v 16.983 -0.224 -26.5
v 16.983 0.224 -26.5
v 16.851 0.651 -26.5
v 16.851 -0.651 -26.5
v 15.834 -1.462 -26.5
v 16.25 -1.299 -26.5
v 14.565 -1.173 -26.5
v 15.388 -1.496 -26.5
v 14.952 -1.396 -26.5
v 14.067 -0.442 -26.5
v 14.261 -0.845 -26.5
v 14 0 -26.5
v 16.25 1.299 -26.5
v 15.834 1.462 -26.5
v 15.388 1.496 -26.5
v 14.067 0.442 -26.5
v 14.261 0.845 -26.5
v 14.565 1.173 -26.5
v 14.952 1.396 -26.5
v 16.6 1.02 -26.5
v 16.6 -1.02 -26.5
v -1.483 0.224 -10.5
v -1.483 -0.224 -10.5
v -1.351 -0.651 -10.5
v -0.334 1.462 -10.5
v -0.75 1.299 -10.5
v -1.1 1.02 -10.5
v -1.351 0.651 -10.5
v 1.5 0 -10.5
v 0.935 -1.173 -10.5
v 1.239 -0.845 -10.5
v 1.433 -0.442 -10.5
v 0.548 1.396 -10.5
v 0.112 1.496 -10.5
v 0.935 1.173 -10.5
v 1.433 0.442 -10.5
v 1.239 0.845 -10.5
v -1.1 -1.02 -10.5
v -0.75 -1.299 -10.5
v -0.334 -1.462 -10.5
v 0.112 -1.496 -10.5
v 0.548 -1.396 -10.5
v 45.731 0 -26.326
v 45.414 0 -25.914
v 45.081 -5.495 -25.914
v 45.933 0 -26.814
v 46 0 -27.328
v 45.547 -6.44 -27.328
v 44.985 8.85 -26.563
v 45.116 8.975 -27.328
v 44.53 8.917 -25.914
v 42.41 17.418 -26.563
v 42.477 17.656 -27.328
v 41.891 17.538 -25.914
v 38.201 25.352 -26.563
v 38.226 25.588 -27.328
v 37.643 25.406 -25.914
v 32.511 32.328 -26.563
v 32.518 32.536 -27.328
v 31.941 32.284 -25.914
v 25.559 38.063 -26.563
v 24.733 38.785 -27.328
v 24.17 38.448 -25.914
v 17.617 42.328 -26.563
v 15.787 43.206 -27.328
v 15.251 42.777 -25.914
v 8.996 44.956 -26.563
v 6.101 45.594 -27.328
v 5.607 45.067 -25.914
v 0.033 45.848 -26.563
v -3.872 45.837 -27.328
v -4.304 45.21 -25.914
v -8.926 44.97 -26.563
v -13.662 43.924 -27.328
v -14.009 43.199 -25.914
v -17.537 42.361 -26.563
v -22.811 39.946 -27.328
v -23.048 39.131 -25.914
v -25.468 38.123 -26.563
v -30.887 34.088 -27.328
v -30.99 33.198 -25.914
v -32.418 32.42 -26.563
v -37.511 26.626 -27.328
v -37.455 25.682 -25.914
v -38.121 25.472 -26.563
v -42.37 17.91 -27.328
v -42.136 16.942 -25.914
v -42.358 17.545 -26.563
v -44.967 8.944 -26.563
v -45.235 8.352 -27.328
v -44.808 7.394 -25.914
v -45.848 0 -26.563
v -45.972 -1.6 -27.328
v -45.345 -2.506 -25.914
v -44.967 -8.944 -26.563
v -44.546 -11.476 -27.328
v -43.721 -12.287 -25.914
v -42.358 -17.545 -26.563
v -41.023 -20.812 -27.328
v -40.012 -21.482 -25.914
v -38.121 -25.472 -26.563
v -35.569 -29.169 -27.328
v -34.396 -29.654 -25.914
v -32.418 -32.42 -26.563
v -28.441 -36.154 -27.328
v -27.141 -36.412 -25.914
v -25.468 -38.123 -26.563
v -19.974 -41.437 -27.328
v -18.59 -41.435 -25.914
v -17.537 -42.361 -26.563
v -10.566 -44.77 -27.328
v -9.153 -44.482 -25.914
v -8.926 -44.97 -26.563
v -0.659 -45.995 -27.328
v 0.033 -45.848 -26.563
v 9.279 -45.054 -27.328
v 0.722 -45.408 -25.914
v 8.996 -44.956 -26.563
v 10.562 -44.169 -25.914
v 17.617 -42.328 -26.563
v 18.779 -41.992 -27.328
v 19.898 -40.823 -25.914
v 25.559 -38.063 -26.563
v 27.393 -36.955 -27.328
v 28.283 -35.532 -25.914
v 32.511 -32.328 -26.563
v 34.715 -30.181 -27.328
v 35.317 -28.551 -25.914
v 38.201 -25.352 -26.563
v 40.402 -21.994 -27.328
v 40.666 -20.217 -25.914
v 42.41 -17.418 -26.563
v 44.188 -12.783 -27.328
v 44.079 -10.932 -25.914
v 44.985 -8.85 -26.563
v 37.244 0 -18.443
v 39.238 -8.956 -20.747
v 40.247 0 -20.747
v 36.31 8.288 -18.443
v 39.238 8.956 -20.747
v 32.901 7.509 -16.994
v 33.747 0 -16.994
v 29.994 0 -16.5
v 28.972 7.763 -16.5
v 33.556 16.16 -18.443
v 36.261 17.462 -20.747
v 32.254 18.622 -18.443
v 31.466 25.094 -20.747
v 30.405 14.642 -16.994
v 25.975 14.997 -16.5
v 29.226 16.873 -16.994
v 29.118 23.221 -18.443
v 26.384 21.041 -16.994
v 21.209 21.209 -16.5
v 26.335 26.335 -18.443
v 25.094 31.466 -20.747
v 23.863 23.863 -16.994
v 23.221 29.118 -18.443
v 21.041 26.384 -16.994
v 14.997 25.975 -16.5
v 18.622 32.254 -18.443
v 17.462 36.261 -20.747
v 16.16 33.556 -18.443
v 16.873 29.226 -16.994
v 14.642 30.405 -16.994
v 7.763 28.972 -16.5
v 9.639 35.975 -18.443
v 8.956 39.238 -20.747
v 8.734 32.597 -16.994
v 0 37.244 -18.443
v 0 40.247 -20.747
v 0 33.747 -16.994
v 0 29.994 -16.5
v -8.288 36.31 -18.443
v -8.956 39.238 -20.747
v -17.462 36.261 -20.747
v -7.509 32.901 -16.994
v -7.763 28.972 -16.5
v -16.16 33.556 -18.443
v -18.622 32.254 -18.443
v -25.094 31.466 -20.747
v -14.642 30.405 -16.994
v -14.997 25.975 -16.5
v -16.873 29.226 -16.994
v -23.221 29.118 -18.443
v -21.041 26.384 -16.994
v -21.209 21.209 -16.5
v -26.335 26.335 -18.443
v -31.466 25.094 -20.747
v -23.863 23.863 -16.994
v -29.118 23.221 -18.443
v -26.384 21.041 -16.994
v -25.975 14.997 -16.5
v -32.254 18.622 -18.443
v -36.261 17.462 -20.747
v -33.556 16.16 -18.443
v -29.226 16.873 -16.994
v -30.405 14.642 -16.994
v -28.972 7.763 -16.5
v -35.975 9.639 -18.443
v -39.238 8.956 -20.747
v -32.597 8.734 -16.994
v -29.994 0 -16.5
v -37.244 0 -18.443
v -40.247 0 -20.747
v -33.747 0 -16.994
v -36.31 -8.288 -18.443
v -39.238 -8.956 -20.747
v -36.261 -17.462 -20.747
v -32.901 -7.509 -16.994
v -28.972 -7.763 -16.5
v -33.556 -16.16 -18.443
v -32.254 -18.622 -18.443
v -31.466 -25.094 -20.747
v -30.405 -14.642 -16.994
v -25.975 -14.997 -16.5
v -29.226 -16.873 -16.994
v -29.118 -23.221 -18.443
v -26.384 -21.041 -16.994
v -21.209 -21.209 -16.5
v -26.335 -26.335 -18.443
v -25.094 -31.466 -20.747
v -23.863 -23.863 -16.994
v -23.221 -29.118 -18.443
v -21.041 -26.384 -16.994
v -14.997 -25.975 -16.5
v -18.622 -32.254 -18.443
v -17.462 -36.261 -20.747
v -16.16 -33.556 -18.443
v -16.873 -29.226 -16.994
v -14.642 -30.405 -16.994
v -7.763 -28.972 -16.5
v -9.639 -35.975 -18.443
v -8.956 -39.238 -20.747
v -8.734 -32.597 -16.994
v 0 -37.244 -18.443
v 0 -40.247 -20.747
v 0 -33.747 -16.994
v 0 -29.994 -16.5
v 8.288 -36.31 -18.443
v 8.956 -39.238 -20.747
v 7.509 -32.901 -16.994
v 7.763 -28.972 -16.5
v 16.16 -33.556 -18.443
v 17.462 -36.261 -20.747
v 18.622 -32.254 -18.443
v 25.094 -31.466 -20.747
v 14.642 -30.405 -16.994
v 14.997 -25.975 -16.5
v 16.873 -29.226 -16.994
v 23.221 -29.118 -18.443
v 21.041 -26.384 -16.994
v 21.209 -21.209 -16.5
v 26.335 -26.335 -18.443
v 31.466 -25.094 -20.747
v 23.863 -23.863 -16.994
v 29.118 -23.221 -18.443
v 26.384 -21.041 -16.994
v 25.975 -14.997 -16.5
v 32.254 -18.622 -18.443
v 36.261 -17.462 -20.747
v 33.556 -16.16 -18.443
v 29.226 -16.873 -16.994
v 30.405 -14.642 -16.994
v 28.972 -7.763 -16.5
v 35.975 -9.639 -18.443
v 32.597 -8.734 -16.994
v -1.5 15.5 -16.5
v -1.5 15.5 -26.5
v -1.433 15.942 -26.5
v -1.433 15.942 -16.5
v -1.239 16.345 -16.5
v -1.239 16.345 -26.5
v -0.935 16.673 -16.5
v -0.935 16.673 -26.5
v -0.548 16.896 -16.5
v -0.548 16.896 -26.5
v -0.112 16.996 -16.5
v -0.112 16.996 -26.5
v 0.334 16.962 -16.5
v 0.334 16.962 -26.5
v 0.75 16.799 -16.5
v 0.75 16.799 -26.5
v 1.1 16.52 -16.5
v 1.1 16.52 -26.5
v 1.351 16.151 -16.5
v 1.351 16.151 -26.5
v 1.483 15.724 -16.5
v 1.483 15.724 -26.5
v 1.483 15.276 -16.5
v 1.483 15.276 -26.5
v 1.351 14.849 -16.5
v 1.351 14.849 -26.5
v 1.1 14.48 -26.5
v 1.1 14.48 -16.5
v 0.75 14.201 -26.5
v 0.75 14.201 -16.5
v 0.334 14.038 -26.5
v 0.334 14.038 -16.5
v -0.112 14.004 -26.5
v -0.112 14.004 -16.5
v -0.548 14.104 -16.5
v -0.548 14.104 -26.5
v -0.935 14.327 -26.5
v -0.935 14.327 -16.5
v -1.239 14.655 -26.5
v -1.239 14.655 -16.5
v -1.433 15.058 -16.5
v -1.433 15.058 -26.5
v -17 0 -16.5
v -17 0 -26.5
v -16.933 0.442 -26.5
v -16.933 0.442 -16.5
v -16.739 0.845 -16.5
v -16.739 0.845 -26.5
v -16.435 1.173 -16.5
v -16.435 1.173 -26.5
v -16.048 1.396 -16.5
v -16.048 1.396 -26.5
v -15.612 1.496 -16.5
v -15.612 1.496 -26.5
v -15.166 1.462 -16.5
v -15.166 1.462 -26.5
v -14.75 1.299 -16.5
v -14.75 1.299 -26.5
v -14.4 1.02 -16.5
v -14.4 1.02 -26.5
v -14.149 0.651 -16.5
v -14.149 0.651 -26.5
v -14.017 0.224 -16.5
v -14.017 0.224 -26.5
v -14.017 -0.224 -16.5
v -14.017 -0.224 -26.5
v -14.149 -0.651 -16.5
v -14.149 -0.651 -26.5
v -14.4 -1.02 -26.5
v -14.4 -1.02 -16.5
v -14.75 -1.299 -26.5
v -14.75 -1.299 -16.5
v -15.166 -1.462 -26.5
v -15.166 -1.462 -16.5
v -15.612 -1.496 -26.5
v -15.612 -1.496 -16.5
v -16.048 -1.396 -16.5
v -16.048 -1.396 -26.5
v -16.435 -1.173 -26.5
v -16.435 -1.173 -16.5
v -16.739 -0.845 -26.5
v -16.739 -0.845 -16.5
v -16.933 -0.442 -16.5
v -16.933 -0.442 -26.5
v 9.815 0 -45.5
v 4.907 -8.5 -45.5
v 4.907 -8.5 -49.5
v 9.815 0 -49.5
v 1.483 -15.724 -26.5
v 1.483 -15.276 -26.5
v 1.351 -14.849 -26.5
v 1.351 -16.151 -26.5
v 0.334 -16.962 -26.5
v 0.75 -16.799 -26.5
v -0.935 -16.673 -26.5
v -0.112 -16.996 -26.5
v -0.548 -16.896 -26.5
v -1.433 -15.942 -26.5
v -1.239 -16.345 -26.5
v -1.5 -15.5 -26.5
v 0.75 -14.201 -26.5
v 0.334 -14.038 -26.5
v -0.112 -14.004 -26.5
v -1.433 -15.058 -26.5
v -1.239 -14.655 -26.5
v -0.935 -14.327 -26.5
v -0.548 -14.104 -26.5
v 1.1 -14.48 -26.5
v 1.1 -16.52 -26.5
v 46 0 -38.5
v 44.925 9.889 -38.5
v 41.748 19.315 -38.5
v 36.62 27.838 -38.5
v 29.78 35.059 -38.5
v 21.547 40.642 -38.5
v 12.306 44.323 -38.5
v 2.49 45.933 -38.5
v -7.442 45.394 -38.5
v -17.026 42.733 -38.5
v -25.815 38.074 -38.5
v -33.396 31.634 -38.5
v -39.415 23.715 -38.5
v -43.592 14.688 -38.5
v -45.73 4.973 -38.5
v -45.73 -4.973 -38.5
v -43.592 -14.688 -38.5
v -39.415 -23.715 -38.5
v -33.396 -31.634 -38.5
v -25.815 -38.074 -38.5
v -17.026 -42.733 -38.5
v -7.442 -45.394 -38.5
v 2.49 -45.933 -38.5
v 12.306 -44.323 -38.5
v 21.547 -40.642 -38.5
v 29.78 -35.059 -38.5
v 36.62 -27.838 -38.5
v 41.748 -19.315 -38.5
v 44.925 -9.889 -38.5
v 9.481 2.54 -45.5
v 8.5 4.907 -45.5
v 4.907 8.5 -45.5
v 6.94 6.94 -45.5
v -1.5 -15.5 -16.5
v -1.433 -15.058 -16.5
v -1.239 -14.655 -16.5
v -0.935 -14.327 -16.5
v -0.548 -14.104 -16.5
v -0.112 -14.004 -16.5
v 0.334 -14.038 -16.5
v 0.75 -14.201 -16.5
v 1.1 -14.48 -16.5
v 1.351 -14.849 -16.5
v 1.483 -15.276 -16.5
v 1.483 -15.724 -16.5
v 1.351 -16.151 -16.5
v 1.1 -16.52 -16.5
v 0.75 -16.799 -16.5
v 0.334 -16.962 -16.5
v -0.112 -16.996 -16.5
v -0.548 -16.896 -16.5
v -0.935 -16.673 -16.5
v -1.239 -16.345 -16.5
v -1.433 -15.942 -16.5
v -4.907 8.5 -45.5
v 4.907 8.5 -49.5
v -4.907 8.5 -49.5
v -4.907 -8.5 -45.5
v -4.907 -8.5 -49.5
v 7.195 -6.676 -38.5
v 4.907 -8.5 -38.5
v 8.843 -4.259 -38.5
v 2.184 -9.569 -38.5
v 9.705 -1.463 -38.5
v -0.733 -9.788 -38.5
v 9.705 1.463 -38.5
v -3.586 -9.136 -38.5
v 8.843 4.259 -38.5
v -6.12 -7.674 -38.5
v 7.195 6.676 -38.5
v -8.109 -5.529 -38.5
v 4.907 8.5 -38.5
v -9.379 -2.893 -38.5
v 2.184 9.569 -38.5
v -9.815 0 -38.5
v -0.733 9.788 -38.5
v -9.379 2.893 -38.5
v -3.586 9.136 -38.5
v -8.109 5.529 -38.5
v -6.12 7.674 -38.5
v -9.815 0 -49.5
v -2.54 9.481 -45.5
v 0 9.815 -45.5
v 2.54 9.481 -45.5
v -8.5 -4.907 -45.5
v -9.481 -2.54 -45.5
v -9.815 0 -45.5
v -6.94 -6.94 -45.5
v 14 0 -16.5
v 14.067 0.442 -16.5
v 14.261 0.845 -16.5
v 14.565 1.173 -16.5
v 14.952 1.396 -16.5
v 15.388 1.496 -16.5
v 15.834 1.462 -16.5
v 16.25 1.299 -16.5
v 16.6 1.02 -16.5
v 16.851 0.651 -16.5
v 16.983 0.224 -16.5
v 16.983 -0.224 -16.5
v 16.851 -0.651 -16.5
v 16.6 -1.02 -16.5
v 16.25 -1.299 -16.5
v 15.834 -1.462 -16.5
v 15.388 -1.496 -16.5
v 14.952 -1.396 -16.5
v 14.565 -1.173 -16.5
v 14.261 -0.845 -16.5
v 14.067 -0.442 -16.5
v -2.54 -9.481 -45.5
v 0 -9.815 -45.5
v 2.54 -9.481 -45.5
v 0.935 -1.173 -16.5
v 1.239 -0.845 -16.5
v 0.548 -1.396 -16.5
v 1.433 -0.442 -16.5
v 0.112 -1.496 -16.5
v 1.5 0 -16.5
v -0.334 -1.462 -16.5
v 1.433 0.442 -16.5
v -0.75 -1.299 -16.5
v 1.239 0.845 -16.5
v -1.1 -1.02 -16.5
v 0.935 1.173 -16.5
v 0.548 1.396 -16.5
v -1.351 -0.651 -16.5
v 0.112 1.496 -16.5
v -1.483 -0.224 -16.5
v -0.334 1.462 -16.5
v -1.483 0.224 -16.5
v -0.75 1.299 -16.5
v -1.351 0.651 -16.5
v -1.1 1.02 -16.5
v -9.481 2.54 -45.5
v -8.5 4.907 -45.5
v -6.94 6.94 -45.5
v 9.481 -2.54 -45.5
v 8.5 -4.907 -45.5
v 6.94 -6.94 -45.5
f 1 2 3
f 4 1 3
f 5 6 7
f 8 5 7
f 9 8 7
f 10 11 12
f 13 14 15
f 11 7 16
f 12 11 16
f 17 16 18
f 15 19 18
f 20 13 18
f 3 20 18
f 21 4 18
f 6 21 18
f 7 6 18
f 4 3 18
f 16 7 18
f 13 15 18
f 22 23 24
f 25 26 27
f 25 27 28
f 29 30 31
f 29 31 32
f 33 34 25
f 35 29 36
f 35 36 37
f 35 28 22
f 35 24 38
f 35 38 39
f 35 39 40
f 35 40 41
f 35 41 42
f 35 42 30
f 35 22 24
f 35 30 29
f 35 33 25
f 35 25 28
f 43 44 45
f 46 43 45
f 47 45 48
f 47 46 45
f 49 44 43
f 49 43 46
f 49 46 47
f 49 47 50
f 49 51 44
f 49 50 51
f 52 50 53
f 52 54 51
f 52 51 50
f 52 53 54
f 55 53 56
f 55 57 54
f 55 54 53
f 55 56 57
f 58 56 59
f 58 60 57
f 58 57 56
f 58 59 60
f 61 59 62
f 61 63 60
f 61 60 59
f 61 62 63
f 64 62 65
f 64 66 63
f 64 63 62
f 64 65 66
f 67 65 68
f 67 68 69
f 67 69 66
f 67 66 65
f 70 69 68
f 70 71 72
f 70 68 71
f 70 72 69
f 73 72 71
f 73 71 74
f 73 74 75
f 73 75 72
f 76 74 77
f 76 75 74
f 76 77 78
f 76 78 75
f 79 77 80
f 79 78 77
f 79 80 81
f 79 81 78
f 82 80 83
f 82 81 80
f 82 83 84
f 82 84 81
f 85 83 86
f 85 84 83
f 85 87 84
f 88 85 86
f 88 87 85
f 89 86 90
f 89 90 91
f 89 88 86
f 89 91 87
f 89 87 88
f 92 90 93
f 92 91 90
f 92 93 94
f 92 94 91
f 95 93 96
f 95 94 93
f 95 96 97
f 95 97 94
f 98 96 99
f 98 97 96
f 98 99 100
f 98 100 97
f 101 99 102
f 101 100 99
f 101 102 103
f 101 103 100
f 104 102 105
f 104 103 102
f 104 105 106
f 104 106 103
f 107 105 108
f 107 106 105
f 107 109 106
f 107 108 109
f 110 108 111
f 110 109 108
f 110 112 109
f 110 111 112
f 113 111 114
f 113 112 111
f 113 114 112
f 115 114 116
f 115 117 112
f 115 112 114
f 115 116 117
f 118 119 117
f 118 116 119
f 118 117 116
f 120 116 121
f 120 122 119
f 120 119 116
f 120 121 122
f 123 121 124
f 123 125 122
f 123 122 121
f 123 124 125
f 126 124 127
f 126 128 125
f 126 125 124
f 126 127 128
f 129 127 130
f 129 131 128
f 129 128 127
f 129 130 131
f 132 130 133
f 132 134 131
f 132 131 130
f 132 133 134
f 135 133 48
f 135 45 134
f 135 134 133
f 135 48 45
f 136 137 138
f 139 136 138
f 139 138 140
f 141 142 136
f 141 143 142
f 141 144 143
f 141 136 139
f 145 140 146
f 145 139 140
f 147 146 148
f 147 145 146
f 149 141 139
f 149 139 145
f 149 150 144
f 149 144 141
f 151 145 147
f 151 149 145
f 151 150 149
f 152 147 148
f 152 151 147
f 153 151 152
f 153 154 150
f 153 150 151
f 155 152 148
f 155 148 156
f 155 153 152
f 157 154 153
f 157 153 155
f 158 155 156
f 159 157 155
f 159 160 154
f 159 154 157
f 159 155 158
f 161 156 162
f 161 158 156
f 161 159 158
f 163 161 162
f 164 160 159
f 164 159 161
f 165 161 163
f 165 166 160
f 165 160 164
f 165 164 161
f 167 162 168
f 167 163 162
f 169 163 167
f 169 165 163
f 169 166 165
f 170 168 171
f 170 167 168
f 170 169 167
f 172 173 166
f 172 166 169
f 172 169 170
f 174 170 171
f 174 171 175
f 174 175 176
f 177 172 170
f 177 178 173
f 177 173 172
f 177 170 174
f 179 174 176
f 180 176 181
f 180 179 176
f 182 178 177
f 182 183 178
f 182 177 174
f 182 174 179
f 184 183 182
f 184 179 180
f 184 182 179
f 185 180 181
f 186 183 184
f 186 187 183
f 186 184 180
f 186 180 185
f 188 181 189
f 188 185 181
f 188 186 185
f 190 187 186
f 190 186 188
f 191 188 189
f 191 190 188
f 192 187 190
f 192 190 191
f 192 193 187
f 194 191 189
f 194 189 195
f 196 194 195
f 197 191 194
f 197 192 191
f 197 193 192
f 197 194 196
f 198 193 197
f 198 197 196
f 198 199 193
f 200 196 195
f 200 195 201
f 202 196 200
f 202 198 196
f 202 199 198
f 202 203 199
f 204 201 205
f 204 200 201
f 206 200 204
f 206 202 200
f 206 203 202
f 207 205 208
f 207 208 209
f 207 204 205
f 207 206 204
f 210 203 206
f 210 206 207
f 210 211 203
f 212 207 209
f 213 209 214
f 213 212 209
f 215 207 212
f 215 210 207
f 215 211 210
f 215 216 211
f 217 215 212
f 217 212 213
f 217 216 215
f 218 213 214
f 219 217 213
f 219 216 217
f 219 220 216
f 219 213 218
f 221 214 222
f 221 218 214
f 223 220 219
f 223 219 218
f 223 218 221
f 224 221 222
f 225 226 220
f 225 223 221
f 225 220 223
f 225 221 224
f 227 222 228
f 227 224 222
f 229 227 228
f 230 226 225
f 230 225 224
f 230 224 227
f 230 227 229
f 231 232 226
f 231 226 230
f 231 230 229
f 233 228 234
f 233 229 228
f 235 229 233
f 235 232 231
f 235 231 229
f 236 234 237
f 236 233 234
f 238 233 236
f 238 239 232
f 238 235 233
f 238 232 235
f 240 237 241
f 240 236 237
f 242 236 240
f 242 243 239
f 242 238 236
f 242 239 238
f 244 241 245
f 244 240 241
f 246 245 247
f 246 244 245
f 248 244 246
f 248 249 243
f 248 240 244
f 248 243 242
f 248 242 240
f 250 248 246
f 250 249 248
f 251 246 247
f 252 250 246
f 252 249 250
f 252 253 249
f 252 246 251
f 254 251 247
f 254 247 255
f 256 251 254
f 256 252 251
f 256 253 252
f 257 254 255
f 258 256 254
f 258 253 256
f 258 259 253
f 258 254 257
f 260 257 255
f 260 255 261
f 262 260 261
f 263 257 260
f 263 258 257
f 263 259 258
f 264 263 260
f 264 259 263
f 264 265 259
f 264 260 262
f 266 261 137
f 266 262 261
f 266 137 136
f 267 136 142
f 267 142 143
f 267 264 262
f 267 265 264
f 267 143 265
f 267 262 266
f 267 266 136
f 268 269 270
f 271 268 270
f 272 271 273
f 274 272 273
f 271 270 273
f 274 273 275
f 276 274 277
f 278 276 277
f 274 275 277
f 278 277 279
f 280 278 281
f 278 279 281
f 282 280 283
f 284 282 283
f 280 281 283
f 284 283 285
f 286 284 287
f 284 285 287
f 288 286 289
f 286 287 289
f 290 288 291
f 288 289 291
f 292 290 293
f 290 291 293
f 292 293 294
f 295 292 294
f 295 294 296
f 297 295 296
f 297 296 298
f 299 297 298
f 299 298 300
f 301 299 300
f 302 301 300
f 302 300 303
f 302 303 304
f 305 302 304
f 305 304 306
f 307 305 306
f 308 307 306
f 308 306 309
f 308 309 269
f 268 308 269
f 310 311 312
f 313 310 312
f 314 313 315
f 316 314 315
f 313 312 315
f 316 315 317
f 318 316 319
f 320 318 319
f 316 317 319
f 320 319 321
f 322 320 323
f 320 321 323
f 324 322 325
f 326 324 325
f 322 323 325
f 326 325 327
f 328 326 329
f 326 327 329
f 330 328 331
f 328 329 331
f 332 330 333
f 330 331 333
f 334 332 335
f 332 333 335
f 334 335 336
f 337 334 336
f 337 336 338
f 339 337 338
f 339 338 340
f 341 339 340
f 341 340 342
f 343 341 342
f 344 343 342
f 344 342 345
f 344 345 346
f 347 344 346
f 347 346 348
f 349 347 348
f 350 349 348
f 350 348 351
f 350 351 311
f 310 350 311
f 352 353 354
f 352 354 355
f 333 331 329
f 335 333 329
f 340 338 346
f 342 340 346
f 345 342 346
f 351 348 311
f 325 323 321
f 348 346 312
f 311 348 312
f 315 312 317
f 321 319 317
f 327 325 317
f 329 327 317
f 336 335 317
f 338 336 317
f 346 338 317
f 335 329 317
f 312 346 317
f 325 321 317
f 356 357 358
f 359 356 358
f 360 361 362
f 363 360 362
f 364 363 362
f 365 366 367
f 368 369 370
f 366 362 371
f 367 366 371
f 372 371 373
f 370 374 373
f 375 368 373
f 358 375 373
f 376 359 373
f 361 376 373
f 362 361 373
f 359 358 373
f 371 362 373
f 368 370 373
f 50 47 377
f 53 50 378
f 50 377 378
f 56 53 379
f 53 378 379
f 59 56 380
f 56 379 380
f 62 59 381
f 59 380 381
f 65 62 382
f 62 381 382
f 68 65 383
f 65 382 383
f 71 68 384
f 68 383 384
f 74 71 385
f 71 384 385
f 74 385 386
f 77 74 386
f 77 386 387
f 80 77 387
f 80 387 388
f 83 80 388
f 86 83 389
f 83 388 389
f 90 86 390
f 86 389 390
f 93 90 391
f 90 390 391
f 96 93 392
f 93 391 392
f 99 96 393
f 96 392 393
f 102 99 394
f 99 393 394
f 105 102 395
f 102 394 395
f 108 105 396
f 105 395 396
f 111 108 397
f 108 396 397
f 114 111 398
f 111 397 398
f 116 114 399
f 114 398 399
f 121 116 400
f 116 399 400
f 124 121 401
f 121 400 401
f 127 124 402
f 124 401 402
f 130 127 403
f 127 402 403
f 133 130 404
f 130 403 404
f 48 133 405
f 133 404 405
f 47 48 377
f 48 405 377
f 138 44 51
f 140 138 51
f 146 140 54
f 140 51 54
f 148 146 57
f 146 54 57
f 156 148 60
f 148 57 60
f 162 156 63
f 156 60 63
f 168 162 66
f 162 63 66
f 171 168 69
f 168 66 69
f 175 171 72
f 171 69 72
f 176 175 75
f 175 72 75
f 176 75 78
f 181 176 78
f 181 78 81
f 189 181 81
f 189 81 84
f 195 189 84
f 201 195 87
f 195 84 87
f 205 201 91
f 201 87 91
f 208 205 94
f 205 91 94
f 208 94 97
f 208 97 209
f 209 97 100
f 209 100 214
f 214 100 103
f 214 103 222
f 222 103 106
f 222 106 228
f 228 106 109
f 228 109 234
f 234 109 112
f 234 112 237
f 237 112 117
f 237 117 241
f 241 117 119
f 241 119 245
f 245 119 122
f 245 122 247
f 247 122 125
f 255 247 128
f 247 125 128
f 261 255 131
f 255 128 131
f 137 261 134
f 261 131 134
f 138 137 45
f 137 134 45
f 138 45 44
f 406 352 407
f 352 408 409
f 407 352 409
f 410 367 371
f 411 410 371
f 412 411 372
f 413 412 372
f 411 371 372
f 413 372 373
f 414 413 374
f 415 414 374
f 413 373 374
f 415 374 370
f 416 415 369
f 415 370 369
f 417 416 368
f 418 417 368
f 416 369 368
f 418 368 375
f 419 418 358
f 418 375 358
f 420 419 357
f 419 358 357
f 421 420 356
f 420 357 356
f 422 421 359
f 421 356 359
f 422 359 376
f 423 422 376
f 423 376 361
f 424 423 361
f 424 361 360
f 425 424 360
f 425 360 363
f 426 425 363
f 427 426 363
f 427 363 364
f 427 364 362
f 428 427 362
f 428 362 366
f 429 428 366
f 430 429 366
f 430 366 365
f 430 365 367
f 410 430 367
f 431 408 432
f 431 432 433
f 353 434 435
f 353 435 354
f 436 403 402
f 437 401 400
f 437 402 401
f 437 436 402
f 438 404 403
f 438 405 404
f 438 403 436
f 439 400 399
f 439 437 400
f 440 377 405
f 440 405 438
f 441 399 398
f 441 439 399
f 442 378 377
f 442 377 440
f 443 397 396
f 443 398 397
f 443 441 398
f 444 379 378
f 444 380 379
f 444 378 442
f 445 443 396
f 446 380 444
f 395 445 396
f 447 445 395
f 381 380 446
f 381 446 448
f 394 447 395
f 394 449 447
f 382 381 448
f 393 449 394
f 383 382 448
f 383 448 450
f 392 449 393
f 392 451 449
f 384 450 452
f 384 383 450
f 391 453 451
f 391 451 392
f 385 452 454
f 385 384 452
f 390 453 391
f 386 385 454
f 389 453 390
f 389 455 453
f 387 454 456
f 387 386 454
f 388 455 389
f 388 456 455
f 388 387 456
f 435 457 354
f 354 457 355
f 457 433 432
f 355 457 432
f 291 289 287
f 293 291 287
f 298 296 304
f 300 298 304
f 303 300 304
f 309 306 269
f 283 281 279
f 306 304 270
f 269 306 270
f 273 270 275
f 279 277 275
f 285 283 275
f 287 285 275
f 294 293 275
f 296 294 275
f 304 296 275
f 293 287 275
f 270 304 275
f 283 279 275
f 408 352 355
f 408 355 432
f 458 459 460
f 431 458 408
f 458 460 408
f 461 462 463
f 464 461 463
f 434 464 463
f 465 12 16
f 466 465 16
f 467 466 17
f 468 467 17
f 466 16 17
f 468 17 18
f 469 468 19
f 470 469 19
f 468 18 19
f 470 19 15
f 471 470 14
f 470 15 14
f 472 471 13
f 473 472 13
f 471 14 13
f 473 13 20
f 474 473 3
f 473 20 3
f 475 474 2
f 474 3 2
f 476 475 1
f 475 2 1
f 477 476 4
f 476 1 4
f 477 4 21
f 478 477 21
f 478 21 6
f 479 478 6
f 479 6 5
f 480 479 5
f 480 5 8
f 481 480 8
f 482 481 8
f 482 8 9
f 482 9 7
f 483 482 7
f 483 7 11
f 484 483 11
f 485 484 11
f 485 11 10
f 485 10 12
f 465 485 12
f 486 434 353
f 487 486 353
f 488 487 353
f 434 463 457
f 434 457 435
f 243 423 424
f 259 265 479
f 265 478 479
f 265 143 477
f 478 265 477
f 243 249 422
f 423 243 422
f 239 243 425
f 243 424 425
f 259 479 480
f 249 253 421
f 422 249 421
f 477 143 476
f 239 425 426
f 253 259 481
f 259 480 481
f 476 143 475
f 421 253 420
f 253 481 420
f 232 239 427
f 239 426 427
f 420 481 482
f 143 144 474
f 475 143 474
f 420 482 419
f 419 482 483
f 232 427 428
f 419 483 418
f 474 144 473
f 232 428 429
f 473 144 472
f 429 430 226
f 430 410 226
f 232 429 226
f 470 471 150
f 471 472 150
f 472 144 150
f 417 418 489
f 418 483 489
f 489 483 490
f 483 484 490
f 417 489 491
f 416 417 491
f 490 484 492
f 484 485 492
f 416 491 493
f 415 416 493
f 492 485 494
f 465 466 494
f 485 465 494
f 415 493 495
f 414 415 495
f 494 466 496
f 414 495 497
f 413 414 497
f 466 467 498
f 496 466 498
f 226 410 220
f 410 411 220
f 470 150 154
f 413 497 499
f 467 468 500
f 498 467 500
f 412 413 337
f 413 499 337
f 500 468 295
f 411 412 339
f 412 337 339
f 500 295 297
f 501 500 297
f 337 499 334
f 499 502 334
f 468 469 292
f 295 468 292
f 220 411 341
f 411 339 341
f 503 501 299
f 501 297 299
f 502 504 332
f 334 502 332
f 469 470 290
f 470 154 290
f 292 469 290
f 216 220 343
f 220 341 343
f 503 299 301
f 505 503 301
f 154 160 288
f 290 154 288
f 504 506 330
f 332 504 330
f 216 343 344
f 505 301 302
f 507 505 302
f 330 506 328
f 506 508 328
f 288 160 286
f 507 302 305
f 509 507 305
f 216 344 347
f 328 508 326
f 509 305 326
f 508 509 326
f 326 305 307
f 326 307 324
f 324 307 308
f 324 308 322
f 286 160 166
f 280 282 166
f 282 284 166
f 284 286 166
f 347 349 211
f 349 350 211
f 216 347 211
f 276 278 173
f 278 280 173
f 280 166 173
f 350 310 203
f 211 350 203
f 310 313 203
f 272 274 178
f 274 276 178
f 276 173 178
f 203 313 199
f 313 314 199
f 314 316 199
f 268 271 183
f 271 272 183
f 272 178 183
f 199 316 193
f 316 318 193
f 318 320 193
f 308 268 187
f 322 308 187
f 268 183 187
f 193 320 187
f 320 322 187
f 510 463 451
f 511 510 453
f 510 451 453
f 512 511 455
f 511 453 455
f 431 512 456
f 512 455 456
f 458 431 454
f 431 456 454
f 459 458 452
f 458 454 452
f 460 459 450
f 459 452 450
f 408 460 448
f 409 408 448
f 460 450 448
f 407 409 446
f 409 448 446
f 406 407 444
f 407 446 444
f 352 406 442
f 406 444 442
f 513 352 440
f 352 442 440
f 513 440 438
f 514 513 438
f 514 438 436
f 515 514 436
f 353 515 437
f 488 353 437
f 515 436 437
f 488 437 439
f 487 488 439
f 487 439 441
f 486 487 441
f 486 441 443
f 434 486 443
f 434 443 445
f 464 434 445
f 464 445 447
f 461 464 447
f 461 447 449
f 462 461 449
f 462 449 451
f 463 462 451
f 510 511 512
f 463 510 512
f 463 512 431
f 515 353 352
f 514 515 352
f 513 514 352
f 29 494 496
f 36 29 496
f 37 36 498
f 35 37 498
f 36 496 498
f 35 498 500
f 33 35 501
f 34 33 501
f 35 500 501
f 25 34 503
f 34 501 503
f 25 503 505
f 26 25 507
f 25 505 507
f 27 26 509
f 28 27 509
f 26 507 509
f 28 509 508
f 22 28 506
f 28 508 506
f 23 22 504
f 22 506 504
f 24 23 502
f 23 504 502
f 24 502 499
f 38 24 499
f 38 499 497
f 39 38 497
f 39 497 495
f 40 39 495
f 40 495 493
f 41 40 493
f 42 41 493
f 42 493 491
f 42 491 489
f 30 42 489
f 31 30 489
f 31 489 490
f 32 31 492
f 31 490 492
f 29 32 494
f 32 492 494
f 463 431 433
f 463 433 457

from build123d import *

# Parameters (mm, degrees)
BOSS_EXTRUDE1_DEPTH          = 4
SKETCH3_R                    = 1.5
BOSS_EXTRUDE2_DEPTH          = 6
F_3_0_3_DIAMETER_HOLE1_D     = 3
F_3_0_3_DIAMETER_HOLE1_DEPTH = 10
FILLET2_R                    = 14.5
FILLET3_R                    = 2
CUT_EXTRUDE1_DEPTH           = 74.871510978
CUT_EXTRUDE1_DEPTH_BACK      = 7
SKETCH8_R                    = 46
SKETCH8_R_2                  = 9.814954576


with BuildPart() as part:
    # Sketch1 → Revolve1 (revolve)
    with BuildSketch(Plane(origin=(0, 0, 0), x_dir=(1, 0, 0), z_dir=(0, 1, 0))):
        Polygon((28, 45.5), (0, 45.5), (0, 16.5), (36, 16.5), (46, 26.5), (46, 40.5), align=None)
    revolve(axis=Axis((0, 0, -45.5), (0, 0, 1)))

    # Sketch2 → Boss-Extrude1 (add)
    with BuildSketch(Plane(origin=(0, 0, -45.5), x_dir=(-1, 0, 0), z_dir=(0, 0, -1))):
        Polygon((-9.814954576, 0), (-4.907477288, 8.5), (4.907477288, 8.5), (9.814954576, 0), (4.907477288, -8.5), (-4.907477288, -8.5), align=None)
    extrude(amount=BOSS_EXTRUDE1_DEPTH)

    # Sketch3 → Boss-Extrude2 (add)
    with BuildSketch(Plane.XY.offset(-16.5)):
        Circle(SKETCH3_R)
    extrude(amount=BOSS_EXTRUDE2_DEPTH)

    # Ø3.0 (3) Diameter Hole1
    with Locations(Plane.XY.offset(-16.5)):
        with Locations((-15.5, 0), (0, 15.5), (0, -15.5), (15.5, 0)):
            Hole(F_3_0_3_DIAMETER_HOLE1_D / 2, depth=F_3_0_3_DIAMETER_HOLE1_DEPTH)

    # Fillet2
    fillet2_edges = [part.edges().sort_by_distance(p)[0] for p in [
        (-36, 0, -16.5),
    ]]
    fillet(fillet2_edges, radius=FILLET2_R)

    # Fillet3
    fillet3_edges = [part.edges().sort_by_distance(p)[0] for p in [
        (-46, 0, -26.5),
    ]]
    fillet(fillet3_edges, radius=FILLET3_R)

    # Sketch8 → Cut-Extrude1 (cut, two sides: drawn at the far end of the back side and taken through both)
    with BuildSketch(Plane(origin=(0, 0, -45.5), x_dir=(-1, 0, 0), z_dir=(0, 0, -1)).offset(-CUT_EXTRUDE1_DEPTH_BACK)):
        Circle(SKETCH8_R)
        Circle(SKETCH8_R_2, mode=Mode.SUBTRACT)
    extrude(amount=CUT_EXTRUDE1_DEPTH + CUT_EXTRUDE1_DEPTH_BACK, mode=Mode.SUBTRACT)


solid = part.part
